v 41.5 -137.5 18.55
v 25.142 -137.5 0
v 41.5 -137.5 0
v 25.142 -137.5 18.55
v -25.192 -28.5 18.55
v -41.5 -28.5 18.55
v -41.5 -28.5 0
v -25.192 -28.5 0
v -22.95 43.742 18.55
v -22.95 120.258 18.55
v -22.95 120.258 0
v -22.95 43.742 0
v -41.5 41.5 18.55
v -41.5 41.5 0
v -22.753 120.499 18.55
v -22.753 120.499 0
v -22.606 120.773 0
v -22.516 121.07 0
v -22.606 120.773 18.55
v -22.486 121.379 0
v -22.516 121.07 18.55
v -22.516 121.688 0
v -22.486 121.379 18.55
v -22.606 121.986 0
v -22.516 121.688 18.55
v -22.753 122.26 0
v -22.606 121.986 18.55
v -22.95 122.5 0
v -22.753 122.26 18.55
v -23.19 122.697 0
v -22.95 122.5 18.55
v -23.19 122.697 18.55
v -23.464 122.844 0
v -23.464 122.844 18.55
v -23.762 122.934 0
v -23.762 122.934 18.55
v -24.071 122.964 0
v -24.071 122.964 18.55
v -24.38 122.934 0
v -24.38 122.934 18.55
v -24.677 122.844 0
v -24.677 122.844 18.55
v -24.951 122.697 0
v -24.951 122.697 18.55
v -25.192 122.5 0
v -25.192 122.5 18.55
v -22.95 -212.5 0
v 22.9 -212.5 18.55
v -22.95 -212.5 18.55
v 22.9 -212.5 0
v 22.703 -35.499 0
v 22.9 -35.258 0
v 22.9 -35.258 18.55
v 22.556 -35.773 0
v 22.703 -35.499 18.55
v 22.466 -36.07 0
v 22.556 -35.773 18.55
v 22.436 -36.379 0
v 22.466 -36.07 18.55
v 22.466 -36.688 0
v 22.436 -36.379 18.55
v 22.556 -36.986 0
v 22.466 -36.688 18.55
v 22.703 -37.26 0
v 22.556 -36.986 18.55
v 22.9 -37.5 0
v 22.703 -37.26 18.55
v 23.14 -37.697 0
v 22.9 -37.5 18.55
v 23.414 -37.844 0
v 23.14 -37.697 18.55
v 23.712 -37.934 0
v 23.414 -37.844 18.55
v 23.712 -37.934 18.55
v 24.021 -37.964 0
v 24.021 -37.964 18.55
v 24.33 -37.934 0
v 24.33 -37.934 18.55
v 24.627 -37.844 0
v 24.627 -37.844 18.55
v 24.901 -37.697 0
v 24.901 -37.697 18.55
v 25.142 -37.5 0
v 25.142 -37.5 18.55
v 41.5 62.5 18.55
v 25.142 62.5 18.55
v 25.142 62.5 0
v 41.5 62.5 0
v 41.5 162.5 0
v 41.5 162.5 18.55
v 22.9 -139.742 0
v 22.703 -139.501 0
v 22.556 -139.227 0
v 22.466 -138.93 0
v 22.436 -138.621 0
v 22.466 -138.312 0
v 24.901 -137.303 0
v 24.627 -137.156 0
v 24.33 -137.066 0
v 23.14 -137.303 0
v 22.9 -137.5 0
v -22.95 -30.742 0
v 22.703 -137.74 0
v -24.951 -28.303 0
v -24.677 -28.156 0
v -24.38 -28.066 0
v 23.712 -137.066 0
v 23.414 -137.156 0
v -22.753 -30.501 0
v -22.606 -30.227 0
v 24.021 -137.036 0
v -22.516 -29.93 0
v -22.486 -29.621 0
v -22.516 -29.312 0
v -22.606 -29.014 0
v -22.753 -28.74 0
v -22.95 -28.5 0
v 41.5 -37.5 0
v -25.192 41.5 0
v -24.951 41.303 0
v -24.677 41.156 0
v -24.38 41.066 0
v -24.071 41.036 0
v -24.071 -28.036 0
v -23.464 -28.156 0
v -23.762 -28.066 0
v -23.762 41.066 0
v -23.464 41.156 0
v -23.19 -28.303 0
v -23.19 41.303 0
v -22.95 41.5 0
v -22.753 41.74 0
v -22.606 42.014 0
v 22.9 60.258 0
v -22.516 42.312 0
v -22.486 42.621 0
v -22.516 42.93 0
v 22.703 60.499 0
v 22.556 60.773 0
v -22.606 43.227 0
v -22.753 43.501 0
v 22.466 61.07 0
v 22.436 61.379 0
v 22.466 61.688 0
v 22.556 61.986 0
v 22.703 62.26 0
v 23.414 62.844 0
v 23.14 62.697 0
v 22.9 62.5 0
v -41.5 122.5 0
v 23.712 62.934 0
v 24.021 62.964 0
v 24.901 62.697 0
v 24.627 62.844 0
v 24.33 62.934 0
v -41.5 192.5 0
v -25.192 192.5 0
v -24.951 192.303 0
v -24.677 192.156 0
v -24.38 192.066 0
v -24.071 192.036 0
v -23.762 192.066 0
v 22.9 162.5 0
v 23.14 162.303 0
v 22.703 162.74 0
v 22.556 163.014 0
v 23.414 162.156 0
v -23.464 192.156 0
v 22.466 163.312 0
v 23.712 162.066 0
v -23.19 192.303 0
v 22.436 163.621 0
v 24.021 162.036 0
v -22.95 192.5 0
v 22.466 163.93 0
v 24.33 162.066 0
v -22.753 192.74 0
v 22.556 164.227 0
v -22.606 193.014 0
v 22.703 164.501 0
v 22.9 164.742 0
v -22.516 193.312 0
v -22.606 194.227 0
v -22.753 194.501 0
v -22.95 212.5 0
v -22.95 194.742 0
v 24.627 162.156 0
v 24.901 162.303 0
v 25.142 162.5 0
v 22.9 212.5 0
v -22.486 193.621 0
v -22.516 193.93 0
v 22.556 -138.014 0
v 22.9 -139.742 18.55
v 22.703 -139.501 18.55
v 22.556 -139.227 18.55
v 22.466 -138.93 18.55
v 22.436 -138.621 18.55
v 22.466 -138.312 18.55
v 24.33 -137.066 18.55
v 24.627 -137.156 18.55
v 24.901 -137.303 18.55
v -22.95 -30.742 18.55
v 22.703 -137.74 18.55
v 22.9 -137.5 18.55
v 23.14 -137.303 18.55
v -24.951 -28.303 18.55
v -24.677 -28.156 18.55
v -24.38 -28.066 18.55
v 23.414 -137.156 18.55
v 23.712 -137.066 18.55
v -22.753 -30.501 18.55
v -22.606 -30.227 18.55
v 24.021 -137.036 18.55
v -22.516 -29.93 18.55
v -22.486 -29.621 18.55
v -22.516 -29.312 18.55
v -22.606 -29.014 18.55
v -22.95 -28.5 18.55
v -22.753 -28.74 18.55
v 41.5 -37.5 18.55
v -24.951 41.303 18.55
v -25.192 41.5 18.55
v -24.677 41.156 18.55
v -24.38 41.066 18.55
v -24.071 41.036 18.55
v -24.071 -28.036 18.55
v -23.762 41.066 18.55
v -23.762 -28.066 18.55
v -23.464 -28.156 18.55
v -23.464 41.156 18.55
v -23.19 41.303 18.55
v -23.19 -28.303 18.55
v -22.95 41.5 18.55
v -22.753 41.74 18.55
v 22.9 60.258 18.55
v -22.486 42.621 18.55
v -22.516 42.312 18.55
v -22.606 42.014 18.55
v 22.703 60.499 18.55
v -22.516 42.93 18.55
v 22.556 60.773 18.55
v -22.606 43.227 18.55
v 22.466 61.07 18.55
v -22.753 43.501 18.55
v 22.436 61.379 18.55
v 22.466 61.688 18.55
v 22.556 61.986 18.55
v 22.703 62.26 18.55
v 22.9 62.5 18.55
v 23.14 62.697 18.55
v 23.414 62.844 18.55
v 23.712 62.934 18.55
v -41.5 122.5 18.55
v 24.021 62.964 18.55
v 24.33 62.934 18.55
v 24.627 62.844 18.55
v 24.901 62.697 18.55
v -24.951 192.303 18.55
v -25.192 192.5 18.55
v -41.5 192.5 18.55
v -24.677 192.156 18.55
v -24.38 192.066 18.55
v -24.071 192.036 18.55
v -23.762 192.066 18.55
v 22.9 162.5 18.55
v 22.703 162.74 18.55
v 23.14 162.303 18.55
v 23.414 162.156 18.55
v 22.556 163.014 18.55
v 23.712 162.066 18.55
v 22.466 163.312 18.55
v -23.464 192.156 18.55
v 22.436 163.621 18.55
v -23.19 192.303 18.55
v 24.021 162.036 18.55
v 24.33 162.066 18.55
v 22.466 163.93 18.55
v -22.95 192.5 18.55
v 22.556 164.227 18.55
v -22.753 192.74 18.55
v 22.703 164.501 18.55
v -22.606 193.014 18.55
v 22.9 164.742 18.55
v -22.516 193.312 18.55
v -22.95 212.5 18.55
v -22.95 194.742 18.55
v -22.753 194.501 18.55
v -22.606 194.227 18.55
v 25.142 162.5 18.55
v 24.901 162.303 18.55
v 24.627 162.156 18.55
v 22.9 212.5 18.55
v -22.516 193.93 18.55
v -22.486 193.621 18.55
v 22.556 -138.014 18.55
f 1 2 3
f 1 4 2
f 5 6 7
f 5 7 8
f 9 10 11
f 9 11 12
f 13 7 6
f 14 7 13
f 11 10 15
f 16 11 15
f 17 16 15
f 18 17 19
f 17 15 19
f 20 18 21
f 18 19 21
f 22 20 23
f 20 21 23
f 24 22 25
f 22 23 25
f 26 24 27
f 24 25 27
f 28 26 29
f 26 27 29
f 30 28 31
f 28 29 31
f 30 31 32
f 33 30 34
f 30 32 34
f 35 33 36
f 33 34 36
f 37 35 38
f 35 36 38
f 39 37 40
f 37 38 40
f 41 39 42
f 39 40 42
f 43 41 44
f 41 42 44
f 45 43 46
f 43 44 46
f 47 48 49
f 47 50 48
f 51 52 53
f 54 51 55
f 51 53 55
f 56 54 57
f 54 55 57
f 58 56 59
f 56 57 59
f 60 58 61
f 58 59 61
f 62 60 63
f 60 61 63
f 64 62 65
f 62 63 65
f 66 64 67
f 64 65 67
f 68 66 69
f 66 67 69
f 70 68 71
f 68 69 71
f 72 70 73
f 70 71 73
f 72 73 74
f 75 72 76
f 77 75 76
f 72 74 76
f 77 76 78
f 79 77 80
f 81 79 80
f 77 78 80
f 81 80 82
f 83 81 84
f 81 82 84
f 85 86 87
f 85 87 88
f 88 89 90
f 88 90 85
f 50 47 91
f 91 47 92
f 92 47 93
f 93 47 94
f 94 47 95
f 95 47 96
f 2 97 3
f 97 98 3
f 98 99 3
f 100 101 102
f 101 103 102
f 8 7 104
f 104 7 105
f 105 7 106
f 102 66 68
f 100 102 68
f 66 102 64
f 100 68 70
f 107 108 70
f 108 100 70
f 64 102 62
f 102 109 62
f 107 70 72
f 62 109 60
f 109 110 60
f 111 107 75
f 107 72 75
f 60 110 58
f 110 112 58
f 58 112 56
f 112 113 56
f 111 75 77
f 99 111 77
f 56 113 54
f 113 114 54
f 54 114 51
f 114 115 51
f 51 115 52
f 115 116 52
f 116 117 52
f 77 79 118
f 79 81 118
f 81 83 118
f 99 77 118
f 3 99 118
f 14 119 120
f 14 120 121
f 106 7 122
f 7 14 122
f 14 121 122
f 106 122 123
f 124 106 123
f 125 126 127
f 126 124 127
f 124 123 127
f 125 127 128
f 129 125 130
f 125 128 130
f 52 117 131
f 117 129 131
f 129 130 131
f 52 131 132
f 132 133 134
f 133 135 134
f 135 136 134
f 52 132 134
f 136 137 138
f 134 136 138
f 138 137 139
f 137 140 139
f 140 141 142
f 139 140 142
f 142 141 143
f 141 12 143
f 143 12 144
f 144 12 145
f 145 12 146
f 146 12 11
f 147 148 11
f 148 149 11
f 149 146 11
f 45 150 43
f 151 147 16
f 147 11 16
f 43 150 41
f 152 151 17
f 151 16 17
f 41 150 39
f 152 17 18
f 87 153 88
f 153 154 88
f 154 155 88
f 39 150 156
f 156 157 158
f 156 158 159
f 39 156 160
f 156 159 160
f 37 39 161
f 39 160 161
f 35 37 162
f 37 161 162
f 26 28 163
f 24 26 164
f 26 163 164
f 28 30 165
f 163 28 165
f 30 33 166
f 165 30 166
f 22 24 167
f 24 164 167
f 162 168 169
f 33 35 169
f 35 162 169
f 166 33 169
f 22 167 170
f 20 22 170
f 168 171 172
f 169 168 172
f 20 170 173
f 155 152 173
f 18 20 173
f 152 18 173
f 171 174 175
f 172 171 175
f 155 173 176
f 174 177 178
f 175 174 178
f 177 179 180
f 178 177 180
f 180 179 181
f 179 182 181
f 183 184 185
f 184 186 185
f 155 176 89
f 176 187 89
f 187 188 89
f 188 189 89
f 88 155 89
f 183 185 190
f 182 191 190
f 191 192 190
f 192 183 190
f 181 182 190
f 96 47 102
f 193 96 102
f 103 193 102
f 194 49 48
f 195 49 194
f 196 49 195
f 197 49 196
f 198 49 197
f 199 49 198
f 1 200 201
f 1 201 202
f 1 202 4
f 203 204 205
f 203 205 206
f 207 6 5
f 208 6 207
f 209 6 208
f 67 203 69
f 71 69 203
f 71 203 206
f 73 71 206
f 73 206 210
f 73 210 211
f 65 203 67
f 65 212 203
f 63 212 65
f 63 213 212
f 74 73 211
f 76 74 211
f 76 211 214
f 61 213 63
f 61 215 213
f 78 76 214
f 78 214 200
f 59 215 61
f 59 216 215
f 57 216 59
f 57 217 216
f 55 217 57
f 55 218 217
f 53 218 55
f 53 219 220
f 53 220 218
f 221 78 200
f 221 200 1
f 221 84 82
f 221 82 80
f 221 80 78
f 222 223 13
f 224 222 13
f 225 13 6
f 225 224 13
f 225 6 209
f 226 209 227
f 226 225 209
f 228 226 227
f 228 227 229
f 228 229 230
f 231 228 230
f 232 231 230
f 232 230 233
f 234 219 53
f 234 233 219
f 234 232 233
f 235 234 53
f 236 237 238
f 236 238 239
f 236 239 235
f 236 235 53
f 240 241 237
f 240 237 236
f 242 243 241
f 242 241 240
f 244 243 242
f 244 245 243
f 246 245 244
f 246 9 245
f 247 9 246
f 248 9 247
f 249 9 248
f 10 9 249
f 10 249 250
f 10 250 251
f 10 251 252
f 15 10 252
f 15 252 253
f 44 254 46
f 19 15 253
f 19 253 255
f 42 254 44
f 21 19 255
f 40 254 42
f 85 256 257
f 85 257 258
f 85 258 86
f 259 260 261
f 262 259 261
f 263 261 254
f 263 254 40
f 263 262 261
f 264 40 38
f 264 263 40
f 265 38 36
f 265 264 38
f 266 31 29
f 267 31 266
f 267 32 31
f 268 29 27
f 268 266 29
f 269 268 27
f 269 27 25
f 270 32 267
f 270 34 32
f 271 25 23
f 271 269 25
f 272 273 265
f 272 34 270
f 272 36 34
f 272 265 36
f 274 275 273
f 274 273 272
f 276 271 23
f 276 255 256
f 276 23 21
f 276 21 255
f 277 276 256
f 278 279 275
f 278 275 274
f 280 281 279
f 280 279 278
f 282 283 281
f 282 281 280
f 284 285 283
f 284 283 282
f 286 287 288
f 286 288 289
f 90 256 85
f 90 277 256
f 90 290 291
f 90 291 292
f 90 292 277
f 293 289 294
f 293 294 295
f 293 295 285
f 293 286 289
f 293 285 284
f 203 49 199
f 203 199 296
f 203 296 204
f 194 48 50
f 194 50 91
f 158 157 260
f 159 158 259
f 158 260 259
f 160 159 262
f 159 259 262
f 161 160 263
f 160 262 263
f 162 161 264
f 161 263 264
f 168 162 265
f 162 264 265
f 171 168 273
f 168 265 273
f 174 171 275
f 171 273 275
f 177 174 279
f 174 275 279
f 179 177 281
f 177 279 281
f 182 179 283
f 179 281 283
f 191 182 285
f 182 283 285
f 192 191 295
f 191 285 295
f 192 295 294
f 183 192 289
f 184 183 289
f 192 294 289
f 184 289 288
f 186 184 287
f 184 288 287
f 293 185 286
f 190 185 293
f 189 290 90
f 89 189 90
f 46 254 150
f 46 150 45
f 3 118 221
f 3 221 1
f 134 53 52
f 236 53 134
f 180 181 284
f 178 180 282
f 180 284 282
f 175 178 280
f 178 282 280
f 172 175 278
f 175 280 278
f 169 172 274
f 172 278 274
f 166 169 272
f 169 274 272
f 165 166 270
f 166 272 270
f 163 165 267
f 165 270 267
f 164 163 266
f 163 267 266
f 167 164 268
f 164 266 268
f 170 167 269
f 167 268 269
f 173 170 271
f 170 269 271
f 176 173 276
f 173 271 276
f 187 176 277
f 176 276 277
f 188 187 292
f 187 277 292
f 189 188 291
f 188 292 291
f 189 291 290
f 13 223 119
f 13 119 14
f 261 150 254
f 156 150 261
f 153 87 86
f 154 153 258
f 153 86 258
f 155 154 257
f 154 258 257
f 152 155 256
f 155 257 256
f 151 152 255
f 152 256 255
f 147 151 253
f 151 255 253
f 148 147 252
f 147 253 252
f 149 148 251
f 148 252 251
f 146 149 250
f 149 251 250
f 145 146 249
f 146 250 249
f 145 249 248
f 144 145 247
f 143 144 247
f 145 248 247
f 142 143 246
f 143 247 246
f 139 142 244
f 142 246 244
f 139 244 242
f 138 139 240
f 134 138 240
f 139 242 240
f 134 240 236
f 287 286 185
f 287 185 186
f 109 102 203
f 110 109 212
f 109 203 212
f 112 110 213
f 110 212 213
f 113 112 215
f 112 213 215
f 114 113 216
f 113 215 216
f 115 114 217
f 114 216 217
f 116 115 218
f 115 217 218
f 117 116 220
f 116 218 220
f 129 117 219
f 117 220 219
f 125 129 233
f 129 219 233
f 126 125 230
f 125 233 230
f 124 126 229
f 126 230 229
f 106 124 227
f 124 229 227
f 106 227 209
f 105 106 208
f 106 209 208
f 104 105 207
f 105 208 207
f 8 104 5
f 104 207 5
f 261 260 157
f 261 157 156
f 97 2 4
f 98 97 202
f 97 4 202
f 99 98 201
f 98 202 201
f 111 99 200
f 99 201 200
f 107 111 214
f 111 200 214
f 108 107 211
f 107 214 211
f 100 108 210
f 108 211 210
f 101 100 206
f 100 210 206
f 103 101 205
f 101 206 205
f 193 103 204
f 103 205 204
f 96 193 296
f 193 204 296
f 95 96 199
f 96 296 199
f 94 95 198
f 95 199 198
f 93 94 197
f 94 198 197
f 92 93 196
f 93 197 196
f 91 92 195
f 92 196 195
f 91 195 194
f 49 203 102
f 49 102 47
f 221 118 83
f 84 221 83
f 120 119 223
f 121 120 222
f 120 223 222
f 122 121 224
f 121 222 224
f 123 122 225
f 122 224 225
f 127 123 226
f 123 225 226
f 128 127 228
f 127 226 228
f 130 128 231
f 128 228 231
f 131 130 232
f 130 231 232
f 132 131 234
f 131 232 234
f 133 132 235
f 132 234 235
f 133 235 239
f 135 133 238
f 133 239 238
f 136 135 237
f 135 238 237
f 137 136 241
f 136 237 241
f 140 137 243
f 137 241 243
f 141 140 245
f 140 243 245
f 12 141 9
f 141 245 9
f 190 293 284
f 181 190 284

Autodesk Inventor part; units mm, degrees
ref_plane "YZ Plane" through (0, 0, 0) normal (1, 0, 0) x (0, 1, 0)
ref_plane "XZ Plane" through (0, 0, 0) normal (0, 1, 0) x (-1, 0, 0)
ref_plane "XY Plane" through (0, 0, 0) normal (0, 0, 1) x (1, 0, 0)
sketch "Esquisse3" plane through (0, 0, 0) normal (0, 0, 1) x (1, 0, 0)
  line L0 (41.5, -212.5) -> (-41.5, -212.5)
  line L1 (-41.5, -212.5) -> (-41.5, 212.5)
  line L2 (-41.5, 212.5) -> (41.5, 212.5)
  line L3 (41.5, 212.5) -> (41.5, -212.5)
  line L4 (41.5, -212.5) -> (-41.5, 212.5) construction
  line L5 (-41.5, -212.5) -> (41.5, 212.5) construction
  point P0 (0, 0)
  dimension "d20" = 83
  dimension "d21" = 425
extrude "Extrusion3" add sketch "Esquisse3" along normal blind 18.55
sketch "Esquisse4" plane through (0, 0, 18.55) normal (0, 0, 1) x (1, 0, 0)
  line L0 (41.5, 212.5) -> (22.9, 212.5)
  line L1 (22.9, 212.5) -> (22.9, 162.5)
  line L2 (22.9, 162.5) -> (41.5, 162.5)
  line L3 (41.5, 162.5) -> (41.5, 212.5)
  line L4 (-41.5, -212.5) -> (41.5, -212.5) projected
  line L5 (41.5, -212.5) -> (22.9, -212.5)
  line L6 (22.9, -212.5) -> (22.9, -137.5)
  line L7 (22.9, -137.5) -> (41.5, -137.5)
  line L8 (41.5, -137.5) -> (41.5, -212.5)
  line L9 (41.5, -37.5) -> (22.9, -37.5)
  line L10 (22.9, -37.5) -> (22.9, 62.5)
  line L11 (22.9, 62.5) -> (41.5, 62.5)
  line L12 (41.5, 62.5) -> (41.5, -37.5)
  point P0 (0, 0)
  dimension "d24" = 75
  dimension "d25" = 50
  dimension "d27" = 100
  dimension "d29" = 100
  dimension "d30" = 100
  dimension "d31" = 18.6
extrude "Extrusion4" cut sketch "Esquisse4" against normal blind 18.55
sketch "Esquisse5" plane through (0, 0, 18.55) normal (0, 0, 1) x (1, 0, 0)
  line L0 (22.9, 212.5) -> (-41.5, 212.5) projected
  line L1 (-41.5, 212.5) -> (-22.95, 212.5)
  line L2 (-22.95, 212.5) -> (-22.95, 192.5)
  line L3 (-22.95, 192.5) -> (-41.5, 192.5)
  line L4 (-41.5, 192.5) -> (-41.5, 212.5)
  line L5 (-41.5, 212.5) -> (-41.5, -212.5) projected
  line L6 (-41.5, 122.5) -> (-22.95, 122.5)
  line L7 (-22.95, 122.5) -> (-22.95, 41.5)
  line L8 (-22.95, 41.5) -> (-41.5, 41.5)
  line L9 (-41.5, 41.5) -> (-41.5, 122.5)
  line L10 (-41.5, -28.5) -> (-22.95, -28.5)
  line L11 (-22.95, -28.5) -> (-22.95, -212.5)
  line L12 (-22.95, -212.5) -> (-41.5, -212.5)
  line L13 (-41.5, -212.5) -> (-41.5, -28.5)
  line L14 (-41.5, -212.5) -> (22.9, -212.5) projected
  point P0 (0, 0)
  point P1 (-41.5, 41.5)
  dimension "d34" = 20
  dimension "d35" = 18.55
  dimension "d37" = 70
  dimension "d38" = 81
  dimension "d39" = 70
extrude "Extrusion5" cut sketch "Esquisse5" against normal blind 18.55
sketch "Esquisse6" plane through (0, 0, 18.55) normal (0, 0, 1) x (1, 0, 0)
  circle A0 centre (-24.0708, 193.6208) radius 1.585
  circle A1 centre (24.0208, 163.6208) radius 1.585
  circle A2 centre (-24.0708, 121.3792) radius 1.585
  circle A3 centre (24.0208, 61.3792) radius 1.585
  circle A4 centre (-24.0708, 42.6208) radius 1.585
  circle A5 centre (24.0208, -36.3792) radius 1.585
  circle A6 centre (-24.0708, -29.6208) radius 1.585
  circle A7 centre (24.0208, -138.6208) radius 1.585
  line L0 (-41.5, 192.5) -> (-22.95, 192.5) projected
  line L1 (-24.0708, 193.6208) -> (-22.95, 192.5) construction
  line L2 (41.5, 162.5) -> (22.9, 162.5) projected
  line L3 (22.9, 162.5) -> (24.0208, 163.6208) construction
  line L4 (-22.95, 122.5) -> (-41.5, 122.5) projected
  line L5 (-22.95, 122.5) -> (-24.0708, 121.3792) construction
  line L6 (-24.0708, 42.6208) -> (-22.95, 41.5) construction
  line L7 (-41.5, 41.5) -> (-22.95, 41.5) projected
  line L8 (22.9, 62.5) -> (24.0208, 61.3792) construction
  line L9 (-22.95, -28.5) -> (-41.5, -28.5) projected
  line L10 (-22.95, -28.5) -> (-24.0708, -29.6208) construction
  line L11 (-22.95, -28.5) -> (-22.95, -212.5) projected
  line L12 (41.5, -37.5) -> (22.9, -37.5) projected
  line L13 (22.9, -37.5) -> (24.0208, -36.3792) construction
  line L14 (22.9, -37.5) -> (22.9, 62.5) projected
  line L15 (22.9, -137.5) -> (41.5, -137.5) projected
  line L16 (22.9, -137.5) -> (24.0208, -138.6208) construction
  point P0 (0, 0)
  dimension "d43" = 3.17
  dimension "d46" = 45
  dimension "d47" = 45
  dimension "d49" = 45
  dimension "d51" = 45
  dimension "d52" = 45
  dimension "d53" = 45
  dimension "d54" = 45
extrude "Extrusion6" cut sketch "Esquisse6" against normal blind 18.55
properties part number "cover"
